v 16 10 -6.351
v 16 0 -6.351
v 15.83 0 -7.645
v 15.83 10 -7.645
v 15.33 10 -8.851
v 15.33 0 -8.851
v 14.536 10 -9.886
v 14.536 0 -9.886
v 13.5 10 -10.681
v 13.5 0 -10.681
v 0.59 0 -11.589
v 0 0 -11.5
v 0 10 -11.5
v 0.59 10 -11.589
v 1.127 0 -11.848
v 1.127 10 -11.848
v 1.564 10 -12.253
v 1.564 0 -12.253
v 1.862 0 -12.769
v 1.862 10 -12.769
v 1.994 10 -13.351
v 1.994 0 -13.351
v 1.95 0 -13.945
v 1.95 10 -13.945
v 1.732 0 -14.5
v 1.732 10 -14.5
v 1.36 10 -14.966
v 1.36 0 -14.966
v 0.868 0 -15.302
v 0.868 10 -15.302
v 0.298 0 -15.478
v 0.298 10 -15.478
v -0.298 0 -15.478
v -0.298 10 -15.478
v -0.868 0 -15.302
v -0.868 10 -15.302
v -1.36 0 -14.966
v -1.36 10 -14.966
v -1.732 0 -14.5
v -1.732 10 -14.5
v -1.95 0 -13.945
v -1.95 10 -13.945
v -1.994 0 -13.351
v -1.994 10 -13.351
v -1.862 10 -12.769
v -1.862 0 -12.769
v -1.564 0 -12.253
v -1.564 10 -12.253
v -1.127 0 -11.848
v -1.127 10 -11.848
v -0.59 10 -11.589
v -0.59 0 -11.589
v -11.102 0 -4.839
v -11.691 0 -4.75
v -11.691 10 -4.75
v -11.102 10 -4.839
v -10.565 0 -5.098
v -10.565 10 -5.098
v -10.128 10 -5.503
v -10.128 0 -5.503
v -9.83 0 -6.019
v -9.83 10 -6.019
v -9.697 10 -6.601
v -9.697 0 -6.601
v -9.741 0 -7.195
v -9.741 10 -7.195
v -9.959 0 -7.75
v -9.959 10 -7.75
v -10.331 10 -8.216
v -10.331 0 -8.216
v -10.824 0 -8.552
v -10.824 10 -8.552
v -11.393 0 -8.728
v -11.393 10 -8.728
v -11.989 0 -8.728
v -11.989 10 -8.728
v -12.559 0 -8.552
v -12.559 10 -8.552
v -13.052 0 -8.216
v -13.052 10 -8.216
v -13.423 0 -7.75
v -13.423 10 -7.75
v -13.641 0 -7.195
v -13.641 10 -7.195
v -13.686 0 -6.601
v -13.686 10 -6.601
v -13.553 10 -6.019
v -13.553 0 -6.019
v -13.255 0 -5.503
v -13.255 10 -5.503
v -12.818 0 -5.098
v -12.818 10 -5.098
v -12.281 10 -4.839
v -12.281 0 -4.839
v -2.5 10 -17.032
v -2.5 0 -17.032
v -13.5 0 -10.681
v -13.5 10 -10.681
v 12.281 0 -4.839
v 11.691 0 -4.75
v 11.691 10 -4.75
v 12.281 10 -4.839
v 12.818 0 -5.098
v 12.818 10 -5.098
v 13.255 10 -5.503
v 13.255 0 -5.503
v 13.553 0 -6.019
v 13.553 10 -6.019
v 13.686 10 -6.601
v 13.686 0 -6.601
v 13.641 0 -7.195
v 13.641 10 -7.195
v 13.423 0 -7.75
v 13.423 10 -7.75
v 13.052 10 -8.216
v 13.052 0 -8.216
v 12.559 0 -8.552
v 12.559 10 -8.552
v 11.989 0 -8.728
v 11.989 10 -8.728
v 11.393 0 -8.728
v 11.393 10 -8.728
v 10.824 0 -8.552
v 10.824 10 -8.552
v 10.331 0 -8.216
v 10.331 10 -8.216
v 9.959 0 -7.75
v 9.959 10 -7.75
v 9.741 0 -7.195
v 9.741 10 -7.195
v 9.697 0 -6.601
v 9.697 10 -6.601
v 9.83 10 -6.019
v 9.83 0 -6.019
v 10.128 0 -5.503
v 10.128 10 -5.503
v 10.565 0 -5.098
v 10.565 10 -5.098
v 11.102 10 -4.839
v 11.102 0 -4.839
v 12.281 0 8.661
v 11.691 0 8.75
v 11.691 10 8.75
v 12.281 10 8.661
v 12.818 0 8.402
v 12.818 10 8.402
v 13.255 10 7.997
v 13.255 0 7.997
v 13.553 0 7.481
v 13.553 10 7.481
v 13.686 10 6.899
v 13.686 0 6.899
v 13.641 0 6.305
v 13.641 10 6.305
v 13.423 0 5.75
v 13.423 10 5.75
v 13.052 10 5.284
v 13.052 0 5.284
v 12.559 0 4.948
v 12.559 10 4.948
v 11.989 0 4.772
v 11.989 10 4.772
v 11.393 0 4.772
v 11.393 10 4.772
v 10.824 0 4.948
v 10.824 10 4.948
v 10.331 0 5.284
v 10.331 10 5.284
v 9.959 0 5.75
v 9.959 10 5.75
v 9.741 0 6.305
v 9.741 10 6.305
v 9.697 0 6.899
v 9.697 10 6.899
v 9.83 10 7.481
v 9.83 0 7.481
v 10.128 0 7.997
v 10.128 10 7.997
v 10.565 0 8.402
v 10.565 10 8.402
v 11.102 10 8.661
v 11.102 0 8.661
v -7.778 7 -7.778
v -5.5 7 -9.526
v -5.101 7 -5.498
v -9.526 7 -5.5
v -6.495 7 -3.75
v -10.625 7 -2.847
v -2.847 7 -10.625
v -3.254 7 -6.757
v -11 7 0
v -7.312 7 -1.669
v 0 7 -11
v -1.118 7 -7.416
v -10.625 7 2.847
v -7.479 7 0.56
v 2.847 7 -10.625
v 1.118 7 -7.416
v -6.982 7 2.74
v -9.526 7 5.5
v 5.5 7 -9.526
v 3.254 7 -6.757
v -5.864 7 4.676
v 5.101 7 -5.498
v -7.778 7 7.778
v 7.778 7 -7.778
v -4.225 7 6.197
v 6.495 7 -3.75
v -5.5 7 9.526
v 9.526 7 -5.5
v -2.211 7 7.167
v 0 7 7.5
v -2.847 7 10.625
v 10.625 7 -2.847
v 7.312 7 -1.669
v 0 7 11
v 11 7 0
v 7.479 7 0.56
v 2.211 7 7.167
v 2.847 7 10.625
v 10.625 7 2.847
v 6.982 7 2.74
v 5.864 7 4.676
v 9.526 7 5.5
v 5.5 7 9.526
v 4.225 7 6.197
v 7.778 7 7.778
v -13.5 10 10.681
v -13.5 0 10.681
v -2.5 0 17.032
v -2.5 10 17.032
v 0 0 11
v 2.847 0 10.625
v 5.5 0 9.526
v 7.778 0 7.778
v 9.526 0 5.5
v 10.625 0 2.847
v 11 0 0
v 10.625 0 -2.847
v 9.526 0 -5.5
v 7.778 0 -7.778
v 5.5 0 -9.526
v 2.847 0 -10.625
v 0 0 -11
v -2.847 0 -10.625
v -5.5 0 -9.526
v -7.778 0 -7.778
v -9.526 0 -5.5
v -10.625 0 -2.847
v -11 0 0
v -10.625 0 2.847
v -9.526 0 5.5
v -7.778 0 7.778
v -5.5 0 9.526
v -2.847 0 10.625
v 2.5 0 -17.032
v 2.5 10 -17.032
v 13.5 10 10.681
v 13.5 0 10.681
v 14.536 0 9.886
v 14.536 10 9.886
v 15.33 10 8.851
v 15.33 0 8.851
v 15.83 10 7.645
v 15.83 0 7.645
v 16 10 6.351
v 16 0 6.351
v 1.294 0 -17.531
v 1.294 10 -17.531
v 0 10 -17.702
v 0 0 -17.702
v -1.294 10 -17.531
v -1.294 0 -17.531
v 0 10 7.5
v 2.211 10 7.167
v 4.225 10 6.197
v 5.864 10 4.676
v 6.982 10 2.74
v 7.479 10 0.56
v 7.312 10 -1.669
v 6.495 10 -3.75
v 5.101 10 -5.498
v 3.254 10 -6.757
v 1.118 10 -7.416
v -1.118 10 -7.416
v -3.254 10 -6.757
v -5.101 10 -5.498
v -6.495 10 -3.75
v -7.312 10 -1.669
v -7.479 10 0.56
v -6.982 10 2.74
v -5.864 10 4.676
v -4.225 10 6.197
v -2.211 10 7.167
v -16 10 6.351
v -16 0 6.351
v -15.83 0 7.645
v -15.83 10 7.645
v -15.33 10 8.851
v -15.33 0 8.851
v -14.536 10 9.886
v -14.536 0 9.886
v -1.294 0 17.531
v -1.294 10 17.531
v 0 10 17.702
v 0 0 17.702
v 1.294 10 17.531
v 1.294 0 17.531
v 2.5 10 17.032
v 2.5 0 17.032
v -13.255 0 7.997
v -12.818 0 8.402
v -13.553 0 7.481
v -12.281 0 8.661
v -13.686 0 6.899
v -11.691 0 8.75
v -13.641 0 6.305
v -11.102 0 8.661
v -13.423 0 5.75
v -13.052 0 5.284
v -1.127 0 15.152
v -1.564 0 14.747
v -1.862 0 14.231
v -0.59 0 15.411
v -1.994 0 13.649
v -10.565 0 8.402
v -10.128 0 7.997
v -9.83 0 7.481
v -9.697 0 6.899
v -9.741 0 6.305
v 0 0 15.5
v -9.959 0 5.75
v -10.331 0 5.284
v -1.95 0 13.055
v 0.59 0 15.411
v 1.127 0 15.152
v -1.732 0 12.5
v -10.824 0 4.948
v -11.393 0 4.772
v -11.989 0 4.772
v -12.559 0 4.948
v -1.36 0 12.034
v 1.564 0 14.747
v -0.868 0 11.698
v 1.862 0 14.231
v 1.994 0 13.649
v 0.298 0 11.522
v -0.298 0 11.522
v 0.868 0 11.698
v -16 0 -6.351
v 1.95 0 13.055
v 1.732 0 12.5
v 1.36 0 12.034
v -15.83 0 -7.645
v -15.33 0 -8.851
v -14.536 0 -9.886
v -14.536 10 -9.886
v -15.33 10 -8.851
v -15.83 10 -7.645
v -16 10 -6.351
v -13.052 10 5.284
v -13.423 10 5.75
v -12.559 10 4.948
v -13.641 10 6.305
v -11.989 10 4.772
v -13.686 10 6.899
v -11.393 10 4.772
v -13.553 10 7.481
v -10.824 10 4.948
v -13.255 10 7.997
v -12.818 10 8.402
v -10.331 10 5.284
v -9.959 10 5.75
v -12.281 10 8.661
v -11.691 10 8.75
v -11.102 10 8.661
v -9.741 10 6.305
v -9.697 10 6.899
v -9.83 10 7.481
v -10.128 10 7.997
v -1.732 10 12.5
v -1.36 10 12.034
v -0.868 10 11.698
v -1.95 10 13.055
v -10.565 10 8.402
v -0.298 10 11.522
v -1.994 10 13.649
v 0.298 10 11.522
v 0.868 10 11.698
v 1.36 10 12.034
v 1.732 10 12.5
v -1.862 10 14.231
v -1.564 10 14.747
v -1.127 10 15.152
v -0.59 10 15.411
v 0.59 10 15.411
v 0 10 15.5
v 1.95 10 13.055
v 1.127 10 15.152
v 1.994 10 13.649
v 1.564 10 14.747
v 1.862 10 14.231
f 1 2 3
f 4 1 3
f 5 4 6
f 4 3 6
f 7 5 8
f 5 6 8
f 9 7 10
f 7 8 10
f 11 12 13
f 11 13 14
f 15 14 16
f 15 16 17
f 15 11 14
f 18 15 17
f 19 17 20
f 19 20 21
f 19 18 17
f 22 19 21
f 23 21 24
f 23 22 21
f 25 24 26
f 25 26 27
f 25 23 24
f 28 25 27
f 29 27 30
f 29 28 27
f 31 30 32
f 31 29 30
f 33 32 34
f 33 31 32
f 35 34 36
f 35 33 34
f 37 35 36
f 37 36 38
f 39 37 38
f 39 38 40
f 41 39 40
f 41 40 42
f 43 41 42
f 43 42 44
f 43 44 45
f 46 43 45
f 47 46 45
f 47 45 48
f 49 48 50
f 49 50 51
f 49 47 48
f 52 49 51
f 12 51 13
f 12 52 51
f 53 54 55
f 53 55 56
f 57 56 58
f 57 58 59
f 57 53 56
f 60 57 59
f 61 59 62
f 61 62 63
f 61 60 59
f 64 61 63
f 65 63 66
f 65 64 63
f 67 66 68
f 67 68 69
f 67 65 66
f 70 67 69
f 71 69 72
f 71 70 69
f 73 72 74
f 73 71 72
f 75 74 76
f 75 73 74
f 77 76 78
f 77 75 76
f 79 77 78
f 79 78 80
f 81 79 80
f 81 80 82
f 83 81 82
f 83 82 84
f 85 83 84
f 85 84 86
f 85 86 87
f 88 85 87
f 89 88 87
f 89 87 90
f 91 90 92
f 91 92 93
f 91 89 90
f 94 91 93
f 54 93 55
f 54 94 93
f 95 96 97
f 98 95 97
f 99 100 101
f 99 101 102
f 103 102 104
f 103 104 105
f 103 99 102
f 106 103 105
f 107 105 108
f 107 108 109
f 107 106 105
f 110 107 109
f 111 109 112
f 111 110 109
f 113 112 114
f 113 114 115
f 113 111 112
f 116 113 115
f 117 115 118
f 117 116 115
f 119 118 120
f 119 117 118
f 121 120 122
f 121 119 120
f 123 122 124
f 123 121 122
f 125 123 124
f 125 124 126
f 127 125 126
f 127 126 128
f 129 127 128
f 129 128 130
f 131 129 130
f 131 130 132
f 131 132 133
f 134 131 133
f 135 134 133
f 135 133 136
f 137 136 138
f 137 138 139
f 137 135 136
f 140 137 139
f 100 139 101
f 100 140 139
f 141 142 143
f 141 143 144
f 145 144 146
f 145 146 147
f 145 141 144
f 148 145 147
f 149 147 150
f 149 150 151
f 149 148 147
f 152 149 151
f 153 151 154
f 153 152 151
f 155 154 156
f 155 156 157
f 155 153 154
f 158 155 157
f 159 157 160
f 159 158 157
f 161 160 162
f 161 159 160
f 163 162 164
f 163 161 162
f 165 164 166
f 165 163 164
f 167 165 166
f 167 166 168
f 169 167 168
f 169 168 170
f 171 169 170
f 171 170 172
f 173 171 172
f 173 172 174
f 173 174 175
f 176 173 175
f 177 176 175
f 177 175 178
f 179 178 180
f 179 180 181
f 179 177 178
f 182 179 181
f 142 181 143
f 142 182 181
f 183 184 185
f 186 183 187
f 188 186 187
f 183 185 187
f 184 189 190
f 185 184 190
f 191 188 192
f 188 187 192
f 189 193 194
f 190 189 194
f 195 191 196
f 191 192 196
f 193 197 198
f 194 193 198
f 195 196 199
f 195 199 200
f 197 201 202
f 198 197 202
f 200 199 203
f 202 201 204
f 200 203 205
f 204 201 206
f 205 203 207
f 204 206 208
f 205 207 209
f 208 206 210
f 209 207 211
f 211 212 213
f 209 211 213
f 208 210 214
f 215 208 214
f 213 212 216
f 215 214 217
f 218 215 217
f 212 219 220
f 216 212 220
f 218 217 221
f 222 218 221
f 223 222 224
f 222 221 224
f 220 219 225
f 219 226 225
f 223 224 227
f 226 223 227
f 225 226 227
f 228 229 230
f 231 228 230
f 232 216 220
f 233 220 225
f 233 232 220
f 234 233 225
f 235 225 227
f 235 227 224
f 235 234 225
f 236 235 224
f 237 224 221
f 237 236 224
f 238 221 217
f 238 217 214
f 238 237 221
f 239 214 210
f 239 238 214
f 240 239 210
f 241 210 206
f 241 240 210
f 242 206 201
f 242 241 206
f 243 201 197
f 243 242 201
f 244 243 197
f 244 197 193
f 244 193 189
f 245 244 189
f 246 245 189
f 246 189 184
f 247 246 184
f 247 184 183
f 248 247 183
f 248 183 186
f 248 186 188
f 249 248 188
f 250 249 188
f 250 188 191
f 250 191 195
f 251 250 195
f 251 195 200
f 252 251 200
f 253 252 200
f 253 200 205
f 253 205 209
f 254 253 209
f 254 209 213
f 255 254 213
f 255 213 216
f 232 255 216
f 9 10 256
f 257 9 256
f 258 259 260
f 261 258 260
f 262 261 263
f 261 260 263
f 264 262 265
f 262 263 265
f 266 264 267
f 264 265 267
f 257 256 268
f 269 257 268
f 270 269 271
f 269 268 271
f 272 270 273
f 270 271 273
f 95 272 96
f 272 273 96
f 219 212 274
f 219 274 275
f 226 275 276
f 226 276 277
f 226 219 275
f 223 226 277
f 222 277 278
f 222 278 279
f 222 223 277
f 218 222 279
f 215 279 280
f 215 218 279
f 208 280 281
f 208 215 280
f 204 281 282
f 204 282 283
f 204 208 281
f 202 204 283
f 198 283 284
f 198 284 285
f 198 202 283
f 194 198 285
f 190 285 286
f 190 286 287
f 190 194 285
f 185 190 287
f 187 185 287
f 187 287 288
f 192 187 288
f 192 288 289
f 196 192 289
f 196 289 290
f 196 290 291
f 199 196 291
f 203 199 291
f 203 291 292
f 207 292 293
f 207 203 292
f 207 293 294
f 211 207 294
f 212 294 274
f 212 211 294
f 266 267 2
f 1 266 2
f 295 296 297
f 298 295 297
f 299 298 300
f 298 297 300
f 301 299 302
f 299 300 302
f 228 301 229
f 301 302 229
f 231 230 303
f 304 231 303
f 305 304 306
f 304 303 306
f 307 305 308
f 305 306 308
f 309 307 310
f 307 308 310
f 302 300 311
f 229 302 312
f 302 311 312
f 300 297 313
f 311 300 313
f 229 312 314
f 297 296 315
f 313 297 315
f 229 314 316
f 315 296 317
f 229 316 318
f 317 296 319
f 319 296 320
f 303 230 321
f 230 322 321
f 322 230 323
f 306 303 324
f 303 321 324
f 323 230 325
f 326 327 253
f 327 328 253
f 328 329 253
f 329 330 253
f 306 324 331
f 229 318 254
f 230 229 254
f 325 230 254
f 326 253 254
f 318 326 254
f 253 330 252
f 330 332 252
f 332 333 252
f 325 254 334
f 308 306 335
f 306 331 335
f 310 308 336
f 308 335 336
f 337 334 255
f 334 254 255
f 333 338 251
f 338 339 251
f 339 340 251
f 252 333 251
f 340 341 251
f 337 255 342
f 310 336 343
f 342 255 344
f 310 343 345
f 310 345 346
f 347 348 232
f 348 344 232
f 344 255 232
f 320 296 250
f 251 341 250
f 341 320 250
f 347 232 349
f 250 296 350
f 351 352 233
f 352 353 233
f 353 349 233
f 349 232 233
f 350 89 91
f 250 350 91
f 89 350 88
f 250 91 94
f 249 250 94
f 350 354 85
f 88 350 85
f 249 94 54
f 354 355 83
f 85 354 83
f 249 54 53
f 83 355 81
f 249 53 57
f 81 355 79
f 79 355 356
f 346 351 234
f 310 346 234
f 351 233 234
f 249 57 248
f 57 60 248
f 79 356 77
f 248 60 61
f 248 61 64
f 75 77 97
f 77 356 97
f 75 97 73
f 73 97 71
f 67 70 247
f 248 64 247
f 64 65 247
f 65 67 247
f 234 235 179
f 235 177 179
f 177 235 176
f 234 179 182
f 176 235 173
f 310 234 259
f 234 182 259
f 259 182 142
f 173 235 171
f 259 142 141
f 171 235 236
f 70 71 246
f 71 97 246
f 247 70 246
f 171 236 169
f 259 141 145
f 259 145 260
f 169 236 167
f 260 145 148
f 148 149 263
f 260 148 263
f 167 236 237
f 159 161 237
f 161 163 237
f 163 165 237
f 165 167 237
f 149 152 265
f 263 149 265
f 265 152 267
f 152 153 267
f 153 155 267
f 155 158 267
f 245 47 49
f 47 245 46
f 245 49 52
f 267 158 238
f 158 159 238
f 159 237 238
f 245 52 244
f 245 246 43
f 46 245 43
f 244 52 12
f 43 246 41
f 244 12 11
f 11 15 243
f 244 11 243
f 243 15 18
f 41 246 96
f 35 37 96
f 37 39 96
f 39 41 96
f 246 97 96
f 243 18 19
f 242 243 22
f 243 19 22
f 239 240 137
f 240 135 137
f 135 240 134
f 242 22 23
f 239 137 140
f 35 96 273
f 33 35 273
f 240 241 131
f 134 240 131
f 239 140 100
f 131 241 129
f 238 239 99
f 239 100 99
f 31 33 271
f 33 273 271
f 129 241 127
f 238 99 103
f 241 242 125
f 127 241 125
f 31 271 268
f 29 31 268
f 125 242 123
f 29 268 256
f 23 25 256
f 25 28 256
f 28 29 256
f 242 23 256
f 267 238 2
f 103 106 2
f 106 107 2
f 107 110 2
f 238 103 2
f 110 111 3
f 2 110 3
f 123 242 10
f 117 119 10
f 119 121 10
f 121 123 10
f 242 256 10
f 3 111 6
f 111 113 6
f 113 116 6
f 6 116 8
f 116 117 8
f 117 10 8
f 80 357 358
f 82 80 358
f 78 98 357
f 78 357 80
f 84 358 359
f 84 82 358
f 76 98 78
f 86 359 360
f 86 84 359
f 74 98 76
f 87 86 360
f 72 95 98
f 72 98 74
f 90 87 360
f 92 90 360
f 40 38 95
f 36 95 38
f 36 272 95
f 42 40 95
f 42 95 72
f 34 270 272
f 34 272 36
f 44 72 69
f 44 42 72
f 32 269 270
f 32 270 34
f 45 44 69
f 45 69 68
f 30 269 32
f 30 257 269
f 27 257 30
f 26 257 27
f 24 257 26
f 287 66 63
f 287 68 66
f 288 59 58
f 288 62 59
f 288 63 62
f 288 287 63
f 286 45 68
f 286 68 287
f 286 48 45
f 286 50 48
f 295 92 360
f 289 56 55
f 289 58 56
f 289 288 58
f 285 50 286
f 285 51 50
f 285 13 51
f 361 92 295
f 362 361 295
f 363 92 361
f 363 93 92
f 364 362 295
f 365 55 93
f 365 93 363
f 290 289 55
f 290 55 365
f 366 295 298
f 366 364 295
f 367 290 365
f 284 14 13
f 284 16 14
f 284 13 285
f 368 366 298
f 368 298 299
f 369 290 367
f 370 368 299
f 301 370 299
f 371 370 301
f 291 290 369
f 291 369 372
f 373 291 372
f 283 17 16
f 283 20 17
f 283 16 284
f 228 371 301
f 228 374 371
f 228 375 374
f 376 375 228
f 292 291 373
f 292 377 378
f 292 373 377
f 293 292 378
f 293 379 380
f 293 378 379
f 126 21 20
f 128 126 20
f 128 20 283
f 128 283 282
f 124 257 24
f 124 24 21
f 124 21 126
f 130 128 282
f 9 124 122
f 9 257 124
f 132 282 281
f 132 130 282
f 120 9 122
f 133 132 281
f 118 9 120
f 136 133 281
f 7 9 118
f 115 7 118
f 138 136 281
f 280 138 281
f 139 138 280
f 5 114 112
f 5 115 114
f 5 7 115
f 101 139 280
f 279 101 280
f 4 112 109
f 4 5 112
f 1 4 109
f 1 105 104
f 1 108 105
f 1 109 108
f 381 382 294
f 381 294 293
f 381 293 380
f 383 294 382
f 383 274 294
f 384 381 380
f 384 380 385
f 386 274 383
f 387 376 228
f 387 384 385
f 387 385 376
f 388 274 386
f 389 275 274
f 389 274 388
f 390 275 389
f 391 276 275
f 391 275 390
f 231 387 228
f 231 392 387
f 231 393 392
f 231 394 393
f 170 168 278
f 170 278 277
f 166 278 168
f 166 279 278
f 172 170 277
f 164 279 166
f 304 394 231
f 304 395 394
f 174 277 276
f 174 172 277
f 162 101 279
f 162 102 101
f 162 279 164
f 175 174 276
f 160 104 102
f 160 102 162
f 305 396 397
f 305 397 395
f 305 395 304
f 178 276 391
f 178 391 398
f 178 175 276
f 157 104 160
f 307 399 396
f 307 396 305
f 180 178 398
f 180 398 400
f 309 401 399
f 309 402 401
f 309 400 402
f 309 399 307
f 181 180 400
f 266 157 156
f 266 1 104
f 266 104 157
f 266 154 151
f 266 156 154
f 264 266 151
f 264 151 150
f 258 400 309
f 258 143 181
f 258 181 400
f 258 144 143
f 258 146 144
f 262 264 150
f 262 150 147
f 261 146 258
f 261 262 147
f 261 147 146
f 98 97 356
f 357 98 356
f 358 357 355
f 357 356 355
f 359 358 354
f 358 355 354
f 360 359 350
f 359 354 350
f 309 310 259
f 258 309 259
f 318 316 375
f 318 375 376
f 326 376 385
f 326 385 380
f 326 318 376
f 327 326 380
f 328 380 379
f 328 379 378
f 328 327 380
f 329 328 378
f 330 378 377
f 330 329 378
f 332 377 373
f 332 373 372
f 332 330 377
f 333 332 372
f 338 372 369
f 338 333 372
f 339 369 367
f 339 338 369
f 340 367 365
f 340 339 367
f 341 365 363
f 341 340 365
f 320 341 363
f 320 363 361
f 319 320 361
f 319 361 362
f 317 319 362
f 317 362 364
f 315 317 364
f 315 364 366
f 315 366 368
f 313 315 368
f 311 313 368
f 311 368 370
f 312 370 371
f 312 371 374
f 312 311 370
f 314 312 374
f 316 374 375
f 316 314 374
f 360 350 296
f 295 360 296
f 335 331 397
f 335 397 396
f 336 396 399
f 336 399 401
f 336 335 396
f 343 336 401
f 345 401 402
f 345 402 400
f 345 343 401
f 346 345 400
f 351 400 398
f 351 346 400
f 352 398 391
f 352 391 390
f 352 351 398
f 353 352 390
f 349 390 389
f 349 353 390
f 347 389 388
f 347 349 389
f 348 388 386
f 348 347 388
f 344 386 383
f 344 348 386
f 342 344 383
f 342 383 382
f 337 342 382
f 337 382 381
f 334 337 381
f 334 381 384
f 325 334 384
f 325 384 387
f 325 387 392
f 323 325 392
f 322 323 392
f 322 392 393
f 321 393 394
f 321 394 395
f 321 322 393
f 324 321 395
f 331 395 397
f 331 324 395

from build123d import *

# Parameters (mm, degrees)
SKETCH1_R           = 11
SKETCH1_R_2         = 2
BOSS_EXTRUDE1_DEPTH = 10
BOSS_EXTRUDE2_START = -3
SKETCH2_R           = 11
SKETCH2_R_2         = 7.5
BOSS_EXTRUDE2_DEPTH = 3


with BuildPart() as part:
    # Sketch1 → Boss-Extrude1 (new body)
    with BuildSketch(Plane(origin=(0, 0, 0), x_dir=(1, 0, 0), z_dir=(0, 1, 0))):
        with BuildLine():
            Line((-2.5, 17.031832941), (-13.5, 10.68097998))
            ThreePointArc((-13.5, 10.68097998), (-15.330127019, 8.850852961), (-16, 6.350852961))
            Line((-16, 6.350852961), (-16, -6.350852961))
            ThreePointArc((-16, -6.350852961), (-15.330127019, -8.850852961), (-13.5, -10.68097998))
            Line((-13.5, -10.68097998), (-2.5, -17.031832941))
            ThreePointArc((-2.5, -17.031832941), (0, -17.701705922), (2.5, -17.031832941))
            Line((2.5, -17.031832941), (13.5, -10.68097998))
            ThreePointArc((13.5, -10.68097998), (15.330127019, -8.850852961), (16, -6.350852961))
            Line((16, -6.350852961), (16, 6.350852961))
            ThreePointArc((16, 6.350852961), (15.330127019, 8.850852961), (13.5, 10.68097998))
            Line((13.5, 10.68097998), (2.5, 17.031832941))
            ThreePointArc((2.5, 17.031832941), (0, 17.701705922), (-2.5, 17.031832941))
        make_face()
        with Locations(Location((0, 0, 0), (0, 0, 270))):
            Circle(SKETCH1_R, mode=Mode.SUBTRACT)
        with Locations(Location((0, 13.5, 0), (0, 0, 270))):
            Circle(SKETCH1_R_2, mode=Mode.SUBTRACT)
        with Locations(Location((11.691342951, 6.75, 0), (0, 0, 270))):
            Circle(SKETCH1_R_2, mode=Mode.SUBTRACT)
        with Locations(Location((11.691342951, -6.75, 0), (0, 0, 270))):
            Circle(SKETCH1_R_2, mode=Mode.SUBTRACT)
        with Locations(Location((0, -13.5, 0), (0, 0, 270))):
            Circle(SKETCH1_R_2, mode=Mode.SUBTRACT)
        with Locations(Location((-11.691342951, -6.75, 0), (0, 0, 270))):
            Circle(SKETCH1_R_2, mode=Mode.SUBTRACT)
        with Locations(Location((-11.691342951, 6.75, 0), (0, 0, 270))):
            Circle(SKETCH1_R_2, mode=Mode.SUBTRACT)
    extrude(amount=BOSS_EXTRUDE1_DEPTH)

    # Sketch2 → Boss-Extrude2 (add)
    with BuildSketch(Plane(origin=(0, 10, 0), x_dir=(1, 0, 0), z_dir=(0, 1, 0)).offset(BOSS_EXTRUDE2_START)):
        with Locations(Location((0, 0, 0), (0, 0, 270))):
            Circle(SKETCH2_R)
        with Locations(Location((0, 0, 0), (0, 0, 270))):
            Circle(SKETCH2_R_2, mode=Mode.SUBTRACT)
    extrude(amount=BOSS_EXTRUDE2_DEPTH)


solid = part.part
